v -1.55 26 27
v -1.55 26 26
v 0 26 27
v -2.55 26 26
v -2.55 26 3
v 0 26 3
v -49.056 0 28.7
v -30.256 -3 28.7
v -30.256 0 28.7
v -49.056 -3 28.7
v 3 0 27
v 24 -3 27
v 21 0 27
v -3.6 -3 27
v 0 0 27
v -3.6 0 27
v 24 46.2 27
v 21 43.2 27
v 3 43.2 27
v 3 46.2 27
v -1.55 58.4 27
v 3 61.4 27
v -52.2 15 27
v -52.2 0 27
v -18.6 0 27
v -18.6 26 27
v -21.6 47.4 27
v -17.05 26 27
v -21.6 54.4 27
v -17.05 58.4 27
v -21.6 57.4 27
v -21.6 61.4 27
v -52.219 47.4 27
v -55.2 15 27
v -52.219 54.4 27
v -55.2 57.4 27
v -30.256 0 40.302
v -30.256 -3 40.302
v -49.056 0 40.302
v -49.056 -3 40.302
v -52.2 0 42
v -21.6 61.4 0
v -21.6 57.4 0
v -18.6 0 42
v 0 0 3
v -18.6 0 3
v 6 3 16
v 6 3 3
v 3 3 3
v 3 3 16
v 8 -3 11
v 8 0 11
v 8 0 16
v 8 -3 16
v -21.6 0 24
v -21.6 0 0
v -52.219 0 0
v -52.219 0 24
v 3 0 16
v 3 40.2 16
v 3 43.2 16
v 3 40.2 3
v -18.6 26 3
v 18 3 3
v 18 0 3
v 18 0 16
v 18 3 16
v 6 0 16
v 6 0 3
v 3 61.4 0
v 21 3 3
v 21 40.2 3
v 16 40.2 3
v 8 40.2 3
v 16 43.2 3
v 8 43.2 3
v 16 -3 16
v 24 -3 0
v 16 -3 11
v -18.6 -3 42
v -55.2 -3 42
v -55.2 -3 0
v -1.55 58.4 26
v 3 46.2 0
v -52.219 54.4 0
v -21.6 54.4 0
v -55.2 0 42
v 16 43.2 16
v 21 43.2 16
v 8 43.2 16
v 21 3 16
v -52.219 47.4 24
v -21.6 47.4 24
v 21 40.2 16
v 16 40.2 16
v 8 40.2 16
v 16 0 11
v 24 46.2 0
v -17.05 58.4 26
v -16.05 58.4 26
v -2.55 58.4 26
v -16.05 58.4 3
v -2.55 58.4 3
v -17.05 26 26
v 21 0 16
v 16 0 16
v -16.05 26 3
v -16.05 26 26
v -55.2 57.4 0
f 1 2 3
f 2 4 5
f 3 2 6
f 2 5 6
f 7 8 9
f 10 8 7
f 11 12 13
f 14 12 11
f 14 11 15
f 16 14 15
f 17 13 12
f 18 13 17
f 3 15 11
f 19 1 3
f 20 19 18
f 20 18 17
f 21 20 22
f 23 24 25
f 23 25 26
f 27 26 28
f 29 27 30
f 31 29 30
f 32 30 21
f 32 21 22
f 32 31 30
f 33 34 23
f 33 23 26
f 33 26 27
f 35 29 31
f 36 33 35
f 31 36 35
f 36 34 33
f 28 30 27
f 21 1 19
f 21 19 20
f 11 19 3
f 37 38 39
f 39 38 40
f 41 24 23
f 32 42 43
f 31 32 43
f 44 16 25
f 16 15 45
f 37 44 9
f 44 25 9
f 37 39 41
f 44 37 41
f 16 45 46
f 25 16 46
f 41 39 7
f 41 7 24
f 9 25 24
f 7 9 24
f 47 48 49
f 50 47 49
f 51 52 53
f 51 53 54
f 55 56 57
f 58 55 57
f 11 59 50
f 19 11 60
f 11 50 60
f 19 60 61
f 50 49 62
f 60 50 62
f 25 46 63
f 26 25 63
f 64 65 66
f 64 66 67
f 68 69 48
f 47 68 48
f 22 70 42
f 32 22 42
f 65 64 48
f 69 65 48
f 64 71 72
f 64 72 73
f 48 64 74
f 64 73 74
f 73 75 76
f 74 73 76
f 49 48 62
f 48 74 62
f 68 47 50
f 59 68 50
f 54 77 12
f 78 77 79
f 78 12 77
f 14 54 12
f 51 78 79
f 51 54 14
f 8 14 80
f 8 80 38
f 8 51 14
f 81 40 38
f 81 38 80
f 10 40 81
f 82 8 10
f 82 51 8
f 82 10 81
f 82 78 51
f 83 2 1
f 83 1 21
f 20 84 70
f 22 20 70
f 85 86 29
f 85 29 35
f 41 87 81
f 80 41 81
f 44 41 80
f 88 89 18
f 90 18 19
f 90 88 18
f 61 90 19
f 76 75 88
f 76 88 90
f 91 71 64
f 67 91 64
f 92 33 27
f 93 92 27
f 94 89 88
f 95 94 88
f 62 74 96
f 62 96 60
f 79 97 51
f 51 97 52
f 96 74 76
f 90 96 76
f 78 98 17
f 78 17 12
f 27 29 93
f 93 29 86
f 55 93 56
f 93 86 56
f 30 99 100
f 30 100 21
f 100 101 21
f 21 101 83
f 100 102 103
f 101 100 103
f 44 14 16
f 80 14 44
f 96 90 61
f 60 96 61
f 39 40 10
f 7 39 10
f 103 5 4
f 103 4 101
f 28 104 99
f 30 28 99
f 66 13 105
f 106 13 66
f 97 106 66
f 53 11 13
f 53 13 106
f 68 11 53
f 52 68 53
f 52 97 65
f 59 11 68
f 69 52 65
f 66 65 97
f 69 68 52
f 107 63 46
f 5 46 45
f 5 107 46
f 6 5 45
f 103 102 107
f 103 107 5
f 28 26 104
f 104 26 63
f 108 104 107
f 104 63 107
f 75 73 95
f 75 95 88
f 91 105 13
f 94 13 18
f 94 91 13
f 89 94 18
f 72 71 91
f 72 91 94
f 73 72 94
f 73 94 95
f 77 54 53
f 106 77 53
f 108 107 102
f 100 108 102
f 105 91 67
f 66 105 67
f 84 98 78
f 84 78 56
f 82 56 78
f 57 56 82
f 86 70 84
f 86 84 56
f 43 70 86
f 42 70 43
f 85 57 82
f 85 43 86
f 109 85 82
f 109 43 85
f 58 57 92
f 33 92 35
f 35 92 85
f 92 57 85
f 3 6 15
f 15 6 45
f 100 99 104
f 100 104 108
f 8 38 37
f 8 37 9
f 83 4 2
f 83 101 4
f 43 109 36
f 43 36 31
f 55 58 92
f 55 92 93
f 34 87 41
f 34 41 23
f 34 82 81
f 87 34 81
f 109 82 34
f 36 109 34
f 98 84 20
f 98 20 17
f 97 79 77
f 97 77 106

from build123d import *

# Parameters (mm, degrees)
SKETCH1_W            = 24.6
SKETCH1_H            = 64.4
BOSS_EXTRUDE1_DEPTH  = 3
SKETCH1_5_W          = 24.6
SKETCH1_5_H          = 64.4
BOSS_EXTRUDE2_DEPTH  = 26
BOSS_EXTRUDE4_DEPTH  = 35
SKETCH1_8_W          = 24.6
SKETCH1_8_H          = 64.4
BOSS_EXTRUDE5_DEPTH  = 27
BOSS_EXTRUDE6_DEPTH  = 3
BOSS_EXTRUDE7_DEPTH  = 2
SKETCH2_4_W          = 8
SKETCH2_4_H          = 3
BOSS_EXTRUDE8_DEPTH  = 11
SKETCH2_5_W          = 5
SKETCH2_5_H          = 3
BOSS_EXTRUDE9_DEPTH  = 27
SKETCH5_W            = 33.6
SKETCH5_H            = 60.4
BOSS_EXTRUDE11_DEPTH = 3
SKETCH5_5_W          = 30.618778274
SKETCH5_5_H          = 54.4
CUT_EXTRUDE3_DEPTH   = 3
BOSS_EXTRUDE12_DEPTH = 27
SKETCH6_W            = 30.618778274
SKETCH6_H            = 47.4
BOSS_EXTRUDE13_DEPTH = 3
SKETCH7_W            = 24.6
SKETCH7_H            = 8
CUT_EXTRUDE4_DEPTH   = 3
SKETCH8_W            = 11
SKETCH8_H            = 3
BOSS_EXTRUDE14_DEPTH = 8
SKETCH2_6_W          = 3
SKETCH2_6_H          = 3
SKETCH2_6_W_2        = 5
BOSS_EXTRUDE15_DEPTH = 16
SKETCH9_W            = 36.6
SKETCH9_H            = 3
BOSS_EXTRUDE16_DEPTH = 15
SKETCH10_W           = 18.8
SKETCH10_H           = 11.60179211
CUT_EXTRUDE5_DEPTH   = 15
BOSS_EXTRUDE17_DEPTH = 3
BOSS_EXTRUDE18_DEPTH = 3


with BuildPart() as part:
    # Sketch1 → Boss-Extrude1 (new body)
    with BuildSketch(Plane.XY):
        with Locations((-9.3, 29.2)):
            Rectangle(SKETCH1_W, SKETCH1_H)
    extrude(amount=BOSS_EXTRUDE1_DEPTH)

    # Sketch1<5> → Boss-Extrude2 (add)
    with BuildSketch(Plane.XY):
        with Locations((-9.3, 29.2)):
            Rectangle(SKETCH1_5_W, SKETCH1_5_H)
        Polygon((0, 0), (-18.6, 0), (-18.6, 26), (-16.05, 26), (-16.05, 58.4), (-2.55, 58.4), (-2.55, 26), (0, 26), align=None, mode=Mode.SUBTRACT)
    extrude(amount=BOSS_EXTRUDE2_DEPTH)

    # Sketch1<7> → Boss-Extrude4 (add)
    with BuildSketch(Plane.XY):
        Polygon((3, 0), (0, 0), (-18.6, 0), (-21.6, 0), (-21.6, -3), (3, -3), align=None)
    extrude(amount=BOSS_EXTRUDE4_DEPTH)

    # Sketch1<8> → Boss-Extrude5 (add)
    with BuildSketch(Plane.XY):
        with Locations((-9.3, 29.2)):
            Rectangle(SKETCH1_8_W, SKETCH1_8_H)
        Polygon((0, 0), (-18.6, 0), (-18.6, 26), (-17.05, 26), (-17.05, 58.4), (-1.55, 58.4), (-1.55, 26), (0, 26), align=None, mode=Mode.SUBTRACT)
    extrude(amount=BOSS_EXTRUDE5_DEPTH)

    # Sketch2 → Boss-Extrude6 (add)
    with BuildSketch(Plane(origin=(0, 0, 0), x_dir=(-1, 0, 0), z_dir=(0, 0, -1))):
        Polygon((-8, 0), (-6, 0), (-6, 3), (-3, 3), (-3, 40.2), (-8, 40.2), (-8, 43.2), (-16, 43.2), (-16, 40.2), (-21, 40.2), (-21, 3), (-18, 3), (-18, 0), (-16, 0), align=None)
    extrude(amount=-BOSS_EXTRUDE6_DEPTH)

    # Sketch2<3> → Boss-Extrude7 (add)
    with BuildSketch(Plane(origin=(0, 0, 0), x_dir=(-1, 0, 0), z_dir=(0, 0, -1))):
        Polygon((-3, -3), (-3, 3), (-6, 3), (-6, 0), (-8, 0), (-8, -3), align=None)
        Polygon((-8, 40.2), (-3, 40.2), (-3, 46.2), (-24, 46.2), (-24, -3), (-16, -3), (-16, 0), (-18, 0), (-18, 3), (-21, 3), (-21, 40.2), (-16, 40.2), (-16, 43.2), (-8, 43.2), align=None)
    extrude(amount=-BOSS_EXTRUDE7_DEPTH)

    # Sketch2<4> → Boss-Extrude8 (add)
    with BuildSketch(Plane(origin=(0, 0, 0), x_dir=(-1, 0, 0), z_dir=(0, 0, -1))):
        with Locations((-12, -1.5)):
            Rectangle(SKETCH2_4_W, SKETCH2_4_H)
    extrude(amount=-BOSS_EXTRUDE8_DEPTH)

    # Sketch2<5> → Boss-Extrude9 (add)
    with BuildSketch(Plane(origin=(0, 0, 0), x_dir=(-1, 0, 0), z_dir=(0, 0, -1))):
        with Locations((-5.5, -1.5)):
            Rectangle(SKETCH2_5_W, SKETCH2_5_H)
        Polygon((-16, -3), (-16, 0), (-21, 0), (-21, 43.2), (-3, 43.2), (-3, 46.2), (-24, 46.2), (-24, -3), align=None)
    extrude(amount=-BOSS_EXTRUDE9_DEPTH)

    # Sketch5 → Boss-Extrude11 (add)
    with BuildSketch(Plane(origin=(0, 0, 0), x_dir=(-1, 0, 0), z_dir=(0, 0, -1))):
        with Locations((38.4, 27.2)):
            Rectangle(SKETCH5_W, SKETCH5_H)
    extrude(amount=-BOSS_EXTRUDE11_DEPTH)

    # Sketch5<5> → Cut-Extrude3 (cut)
    with BuildSketch(Plane(origin=(0, 0, 0), x_dir=(-1, 0, 0), z_dir=(0, 0, -1))):
        with Locations((36.909389137, 27.2)):
            Rectangle(SKETCH5_5_W, SKETCH5_5_H)
    extrude(amount=-CUT_EXTRUDE3_DEPTH, mode=Mode.SUBTRACT)

    # Sketch5<6> → Boss-Extrude12 (add)
    with BuildSketch(Plane(origin=(0, 0, 0), x_dir=(-1, 0, 0), z_dir=(0, 0, -1))):
        Polygon((21.6, 0), (21.6, -3), (55.2, -3), (55.2, 57.4), (21.6, 57.4), (21.6, 54.4), (52.218778274, 54.4), (52.218778274, 0), align=None)
    extrude(amount=-BOSS_EXTRUDE12_DEPTH)

    # Sketch6 → Boss-Extrude13 (add)
    with BuildSketch(Plane.XY.offset(27)):
        with Locations((-36.909389137, 23.7)):
            Rectangle(SKETCH6_W, SKETCH6_H)
    extrude(amount=-BOSS_EXTRUDE13_DEPTH)

    # Sketch7 → Cut-Extrude4 (cut)
    with BuildSketch(Plane.XZ.offset(3)):
        with Locations((-9.3, 31)):
            Rectangle(SKETCH7_W, SKETCH7_H)
    extrude(amount=-CUT_EXTRUDE4_DEPTH, mode=Mode.SUBTRACT)

    # Sketch8 → Boss-Extrude14 (add)
    with BuildSketch(Plane(origin=(8, 0, 0), x_dir=(0, 0, -1), z_dir=(1, 0, 0))):
        with Locations((-21.5, -1.5)):
            Rectangle(SKETCH8_W, SKETCH8_H)
    extrude(amount=BOSS_EXTRUDE14_DEPTH)

    # Sketch2<6> → Boss-Extrude15 (add)
    with BuildSketch(Plane(origin=(0, 0, 0), x_dir=(-1, 0, 0), z_dir=(0, 0, -1))):
        with Locations((-4.5, 1.5)):
            Rectangle(SKETCH2_6_W, SKETCH2_6_H)
        with Locations((-5.5, 41.7)):
            Rectangle(SKETCH2_6_W_2, SKETCH2_6_H)
        with Locations((-19.5, 1.5)):
            Rectangle(SKETCH2_6_W, SKETCH2_6_H)
        with Locations((-18.5, 41.7)):
            Rectangle(SKETCH2_6_W_2, SKETCH2_6_H)
    extrude(amount=-BOSS_EXTRUDE15_DEPTH)

    # Sketch9 → Boss-Extrude16 (add)
    with BuildSketch(Plane.XY.offset(27)):
        with Locations((-36.9, -1.5)):
            Rectangle(SKETCH9_W, SKETCH9_H)
    extrude(amount=BOSS_EXTRUDE16_DEPTH)

    # Sketch10 → Cut-Extrude5 (cut)
    with BuildSketch(Plane(origin=(0, -3, 0), x_dir=(-1, 0, 0), z_dir=(0, -1, 0))):
        with Locations((39.656308117, -34.500896055)):
            Rectangle(SKETCH10_W, SKETCH10_H)
    extrude(amount=-CUT_EXTRUDE5_DEPTH, mode=Mode.SUBTRACT)

    # Sketch11 → Boss-Extrude17 (add)
    with BuildSketch(Plane(origin=(0, -3, 0), x_dir=(-1, 0, 0), z_dir=(0, -1, 0))):
        Polygon((18.6, -42), (18.6, -27), (3.6, -27), align=None)
    extrude(amount=-BOSS_EXTRUDE17_DEPTH)

    # Sketch12 → Boss-Extrude18 (add)
    with BuildSketch(Plane.ZY.offset(55.2)):
        Polygon((27, 0), (42, 0), (27, 15), align=None)
    extrude(amount=-BOSS_EXTRUDE18_DEPTH)


solid = part.part
